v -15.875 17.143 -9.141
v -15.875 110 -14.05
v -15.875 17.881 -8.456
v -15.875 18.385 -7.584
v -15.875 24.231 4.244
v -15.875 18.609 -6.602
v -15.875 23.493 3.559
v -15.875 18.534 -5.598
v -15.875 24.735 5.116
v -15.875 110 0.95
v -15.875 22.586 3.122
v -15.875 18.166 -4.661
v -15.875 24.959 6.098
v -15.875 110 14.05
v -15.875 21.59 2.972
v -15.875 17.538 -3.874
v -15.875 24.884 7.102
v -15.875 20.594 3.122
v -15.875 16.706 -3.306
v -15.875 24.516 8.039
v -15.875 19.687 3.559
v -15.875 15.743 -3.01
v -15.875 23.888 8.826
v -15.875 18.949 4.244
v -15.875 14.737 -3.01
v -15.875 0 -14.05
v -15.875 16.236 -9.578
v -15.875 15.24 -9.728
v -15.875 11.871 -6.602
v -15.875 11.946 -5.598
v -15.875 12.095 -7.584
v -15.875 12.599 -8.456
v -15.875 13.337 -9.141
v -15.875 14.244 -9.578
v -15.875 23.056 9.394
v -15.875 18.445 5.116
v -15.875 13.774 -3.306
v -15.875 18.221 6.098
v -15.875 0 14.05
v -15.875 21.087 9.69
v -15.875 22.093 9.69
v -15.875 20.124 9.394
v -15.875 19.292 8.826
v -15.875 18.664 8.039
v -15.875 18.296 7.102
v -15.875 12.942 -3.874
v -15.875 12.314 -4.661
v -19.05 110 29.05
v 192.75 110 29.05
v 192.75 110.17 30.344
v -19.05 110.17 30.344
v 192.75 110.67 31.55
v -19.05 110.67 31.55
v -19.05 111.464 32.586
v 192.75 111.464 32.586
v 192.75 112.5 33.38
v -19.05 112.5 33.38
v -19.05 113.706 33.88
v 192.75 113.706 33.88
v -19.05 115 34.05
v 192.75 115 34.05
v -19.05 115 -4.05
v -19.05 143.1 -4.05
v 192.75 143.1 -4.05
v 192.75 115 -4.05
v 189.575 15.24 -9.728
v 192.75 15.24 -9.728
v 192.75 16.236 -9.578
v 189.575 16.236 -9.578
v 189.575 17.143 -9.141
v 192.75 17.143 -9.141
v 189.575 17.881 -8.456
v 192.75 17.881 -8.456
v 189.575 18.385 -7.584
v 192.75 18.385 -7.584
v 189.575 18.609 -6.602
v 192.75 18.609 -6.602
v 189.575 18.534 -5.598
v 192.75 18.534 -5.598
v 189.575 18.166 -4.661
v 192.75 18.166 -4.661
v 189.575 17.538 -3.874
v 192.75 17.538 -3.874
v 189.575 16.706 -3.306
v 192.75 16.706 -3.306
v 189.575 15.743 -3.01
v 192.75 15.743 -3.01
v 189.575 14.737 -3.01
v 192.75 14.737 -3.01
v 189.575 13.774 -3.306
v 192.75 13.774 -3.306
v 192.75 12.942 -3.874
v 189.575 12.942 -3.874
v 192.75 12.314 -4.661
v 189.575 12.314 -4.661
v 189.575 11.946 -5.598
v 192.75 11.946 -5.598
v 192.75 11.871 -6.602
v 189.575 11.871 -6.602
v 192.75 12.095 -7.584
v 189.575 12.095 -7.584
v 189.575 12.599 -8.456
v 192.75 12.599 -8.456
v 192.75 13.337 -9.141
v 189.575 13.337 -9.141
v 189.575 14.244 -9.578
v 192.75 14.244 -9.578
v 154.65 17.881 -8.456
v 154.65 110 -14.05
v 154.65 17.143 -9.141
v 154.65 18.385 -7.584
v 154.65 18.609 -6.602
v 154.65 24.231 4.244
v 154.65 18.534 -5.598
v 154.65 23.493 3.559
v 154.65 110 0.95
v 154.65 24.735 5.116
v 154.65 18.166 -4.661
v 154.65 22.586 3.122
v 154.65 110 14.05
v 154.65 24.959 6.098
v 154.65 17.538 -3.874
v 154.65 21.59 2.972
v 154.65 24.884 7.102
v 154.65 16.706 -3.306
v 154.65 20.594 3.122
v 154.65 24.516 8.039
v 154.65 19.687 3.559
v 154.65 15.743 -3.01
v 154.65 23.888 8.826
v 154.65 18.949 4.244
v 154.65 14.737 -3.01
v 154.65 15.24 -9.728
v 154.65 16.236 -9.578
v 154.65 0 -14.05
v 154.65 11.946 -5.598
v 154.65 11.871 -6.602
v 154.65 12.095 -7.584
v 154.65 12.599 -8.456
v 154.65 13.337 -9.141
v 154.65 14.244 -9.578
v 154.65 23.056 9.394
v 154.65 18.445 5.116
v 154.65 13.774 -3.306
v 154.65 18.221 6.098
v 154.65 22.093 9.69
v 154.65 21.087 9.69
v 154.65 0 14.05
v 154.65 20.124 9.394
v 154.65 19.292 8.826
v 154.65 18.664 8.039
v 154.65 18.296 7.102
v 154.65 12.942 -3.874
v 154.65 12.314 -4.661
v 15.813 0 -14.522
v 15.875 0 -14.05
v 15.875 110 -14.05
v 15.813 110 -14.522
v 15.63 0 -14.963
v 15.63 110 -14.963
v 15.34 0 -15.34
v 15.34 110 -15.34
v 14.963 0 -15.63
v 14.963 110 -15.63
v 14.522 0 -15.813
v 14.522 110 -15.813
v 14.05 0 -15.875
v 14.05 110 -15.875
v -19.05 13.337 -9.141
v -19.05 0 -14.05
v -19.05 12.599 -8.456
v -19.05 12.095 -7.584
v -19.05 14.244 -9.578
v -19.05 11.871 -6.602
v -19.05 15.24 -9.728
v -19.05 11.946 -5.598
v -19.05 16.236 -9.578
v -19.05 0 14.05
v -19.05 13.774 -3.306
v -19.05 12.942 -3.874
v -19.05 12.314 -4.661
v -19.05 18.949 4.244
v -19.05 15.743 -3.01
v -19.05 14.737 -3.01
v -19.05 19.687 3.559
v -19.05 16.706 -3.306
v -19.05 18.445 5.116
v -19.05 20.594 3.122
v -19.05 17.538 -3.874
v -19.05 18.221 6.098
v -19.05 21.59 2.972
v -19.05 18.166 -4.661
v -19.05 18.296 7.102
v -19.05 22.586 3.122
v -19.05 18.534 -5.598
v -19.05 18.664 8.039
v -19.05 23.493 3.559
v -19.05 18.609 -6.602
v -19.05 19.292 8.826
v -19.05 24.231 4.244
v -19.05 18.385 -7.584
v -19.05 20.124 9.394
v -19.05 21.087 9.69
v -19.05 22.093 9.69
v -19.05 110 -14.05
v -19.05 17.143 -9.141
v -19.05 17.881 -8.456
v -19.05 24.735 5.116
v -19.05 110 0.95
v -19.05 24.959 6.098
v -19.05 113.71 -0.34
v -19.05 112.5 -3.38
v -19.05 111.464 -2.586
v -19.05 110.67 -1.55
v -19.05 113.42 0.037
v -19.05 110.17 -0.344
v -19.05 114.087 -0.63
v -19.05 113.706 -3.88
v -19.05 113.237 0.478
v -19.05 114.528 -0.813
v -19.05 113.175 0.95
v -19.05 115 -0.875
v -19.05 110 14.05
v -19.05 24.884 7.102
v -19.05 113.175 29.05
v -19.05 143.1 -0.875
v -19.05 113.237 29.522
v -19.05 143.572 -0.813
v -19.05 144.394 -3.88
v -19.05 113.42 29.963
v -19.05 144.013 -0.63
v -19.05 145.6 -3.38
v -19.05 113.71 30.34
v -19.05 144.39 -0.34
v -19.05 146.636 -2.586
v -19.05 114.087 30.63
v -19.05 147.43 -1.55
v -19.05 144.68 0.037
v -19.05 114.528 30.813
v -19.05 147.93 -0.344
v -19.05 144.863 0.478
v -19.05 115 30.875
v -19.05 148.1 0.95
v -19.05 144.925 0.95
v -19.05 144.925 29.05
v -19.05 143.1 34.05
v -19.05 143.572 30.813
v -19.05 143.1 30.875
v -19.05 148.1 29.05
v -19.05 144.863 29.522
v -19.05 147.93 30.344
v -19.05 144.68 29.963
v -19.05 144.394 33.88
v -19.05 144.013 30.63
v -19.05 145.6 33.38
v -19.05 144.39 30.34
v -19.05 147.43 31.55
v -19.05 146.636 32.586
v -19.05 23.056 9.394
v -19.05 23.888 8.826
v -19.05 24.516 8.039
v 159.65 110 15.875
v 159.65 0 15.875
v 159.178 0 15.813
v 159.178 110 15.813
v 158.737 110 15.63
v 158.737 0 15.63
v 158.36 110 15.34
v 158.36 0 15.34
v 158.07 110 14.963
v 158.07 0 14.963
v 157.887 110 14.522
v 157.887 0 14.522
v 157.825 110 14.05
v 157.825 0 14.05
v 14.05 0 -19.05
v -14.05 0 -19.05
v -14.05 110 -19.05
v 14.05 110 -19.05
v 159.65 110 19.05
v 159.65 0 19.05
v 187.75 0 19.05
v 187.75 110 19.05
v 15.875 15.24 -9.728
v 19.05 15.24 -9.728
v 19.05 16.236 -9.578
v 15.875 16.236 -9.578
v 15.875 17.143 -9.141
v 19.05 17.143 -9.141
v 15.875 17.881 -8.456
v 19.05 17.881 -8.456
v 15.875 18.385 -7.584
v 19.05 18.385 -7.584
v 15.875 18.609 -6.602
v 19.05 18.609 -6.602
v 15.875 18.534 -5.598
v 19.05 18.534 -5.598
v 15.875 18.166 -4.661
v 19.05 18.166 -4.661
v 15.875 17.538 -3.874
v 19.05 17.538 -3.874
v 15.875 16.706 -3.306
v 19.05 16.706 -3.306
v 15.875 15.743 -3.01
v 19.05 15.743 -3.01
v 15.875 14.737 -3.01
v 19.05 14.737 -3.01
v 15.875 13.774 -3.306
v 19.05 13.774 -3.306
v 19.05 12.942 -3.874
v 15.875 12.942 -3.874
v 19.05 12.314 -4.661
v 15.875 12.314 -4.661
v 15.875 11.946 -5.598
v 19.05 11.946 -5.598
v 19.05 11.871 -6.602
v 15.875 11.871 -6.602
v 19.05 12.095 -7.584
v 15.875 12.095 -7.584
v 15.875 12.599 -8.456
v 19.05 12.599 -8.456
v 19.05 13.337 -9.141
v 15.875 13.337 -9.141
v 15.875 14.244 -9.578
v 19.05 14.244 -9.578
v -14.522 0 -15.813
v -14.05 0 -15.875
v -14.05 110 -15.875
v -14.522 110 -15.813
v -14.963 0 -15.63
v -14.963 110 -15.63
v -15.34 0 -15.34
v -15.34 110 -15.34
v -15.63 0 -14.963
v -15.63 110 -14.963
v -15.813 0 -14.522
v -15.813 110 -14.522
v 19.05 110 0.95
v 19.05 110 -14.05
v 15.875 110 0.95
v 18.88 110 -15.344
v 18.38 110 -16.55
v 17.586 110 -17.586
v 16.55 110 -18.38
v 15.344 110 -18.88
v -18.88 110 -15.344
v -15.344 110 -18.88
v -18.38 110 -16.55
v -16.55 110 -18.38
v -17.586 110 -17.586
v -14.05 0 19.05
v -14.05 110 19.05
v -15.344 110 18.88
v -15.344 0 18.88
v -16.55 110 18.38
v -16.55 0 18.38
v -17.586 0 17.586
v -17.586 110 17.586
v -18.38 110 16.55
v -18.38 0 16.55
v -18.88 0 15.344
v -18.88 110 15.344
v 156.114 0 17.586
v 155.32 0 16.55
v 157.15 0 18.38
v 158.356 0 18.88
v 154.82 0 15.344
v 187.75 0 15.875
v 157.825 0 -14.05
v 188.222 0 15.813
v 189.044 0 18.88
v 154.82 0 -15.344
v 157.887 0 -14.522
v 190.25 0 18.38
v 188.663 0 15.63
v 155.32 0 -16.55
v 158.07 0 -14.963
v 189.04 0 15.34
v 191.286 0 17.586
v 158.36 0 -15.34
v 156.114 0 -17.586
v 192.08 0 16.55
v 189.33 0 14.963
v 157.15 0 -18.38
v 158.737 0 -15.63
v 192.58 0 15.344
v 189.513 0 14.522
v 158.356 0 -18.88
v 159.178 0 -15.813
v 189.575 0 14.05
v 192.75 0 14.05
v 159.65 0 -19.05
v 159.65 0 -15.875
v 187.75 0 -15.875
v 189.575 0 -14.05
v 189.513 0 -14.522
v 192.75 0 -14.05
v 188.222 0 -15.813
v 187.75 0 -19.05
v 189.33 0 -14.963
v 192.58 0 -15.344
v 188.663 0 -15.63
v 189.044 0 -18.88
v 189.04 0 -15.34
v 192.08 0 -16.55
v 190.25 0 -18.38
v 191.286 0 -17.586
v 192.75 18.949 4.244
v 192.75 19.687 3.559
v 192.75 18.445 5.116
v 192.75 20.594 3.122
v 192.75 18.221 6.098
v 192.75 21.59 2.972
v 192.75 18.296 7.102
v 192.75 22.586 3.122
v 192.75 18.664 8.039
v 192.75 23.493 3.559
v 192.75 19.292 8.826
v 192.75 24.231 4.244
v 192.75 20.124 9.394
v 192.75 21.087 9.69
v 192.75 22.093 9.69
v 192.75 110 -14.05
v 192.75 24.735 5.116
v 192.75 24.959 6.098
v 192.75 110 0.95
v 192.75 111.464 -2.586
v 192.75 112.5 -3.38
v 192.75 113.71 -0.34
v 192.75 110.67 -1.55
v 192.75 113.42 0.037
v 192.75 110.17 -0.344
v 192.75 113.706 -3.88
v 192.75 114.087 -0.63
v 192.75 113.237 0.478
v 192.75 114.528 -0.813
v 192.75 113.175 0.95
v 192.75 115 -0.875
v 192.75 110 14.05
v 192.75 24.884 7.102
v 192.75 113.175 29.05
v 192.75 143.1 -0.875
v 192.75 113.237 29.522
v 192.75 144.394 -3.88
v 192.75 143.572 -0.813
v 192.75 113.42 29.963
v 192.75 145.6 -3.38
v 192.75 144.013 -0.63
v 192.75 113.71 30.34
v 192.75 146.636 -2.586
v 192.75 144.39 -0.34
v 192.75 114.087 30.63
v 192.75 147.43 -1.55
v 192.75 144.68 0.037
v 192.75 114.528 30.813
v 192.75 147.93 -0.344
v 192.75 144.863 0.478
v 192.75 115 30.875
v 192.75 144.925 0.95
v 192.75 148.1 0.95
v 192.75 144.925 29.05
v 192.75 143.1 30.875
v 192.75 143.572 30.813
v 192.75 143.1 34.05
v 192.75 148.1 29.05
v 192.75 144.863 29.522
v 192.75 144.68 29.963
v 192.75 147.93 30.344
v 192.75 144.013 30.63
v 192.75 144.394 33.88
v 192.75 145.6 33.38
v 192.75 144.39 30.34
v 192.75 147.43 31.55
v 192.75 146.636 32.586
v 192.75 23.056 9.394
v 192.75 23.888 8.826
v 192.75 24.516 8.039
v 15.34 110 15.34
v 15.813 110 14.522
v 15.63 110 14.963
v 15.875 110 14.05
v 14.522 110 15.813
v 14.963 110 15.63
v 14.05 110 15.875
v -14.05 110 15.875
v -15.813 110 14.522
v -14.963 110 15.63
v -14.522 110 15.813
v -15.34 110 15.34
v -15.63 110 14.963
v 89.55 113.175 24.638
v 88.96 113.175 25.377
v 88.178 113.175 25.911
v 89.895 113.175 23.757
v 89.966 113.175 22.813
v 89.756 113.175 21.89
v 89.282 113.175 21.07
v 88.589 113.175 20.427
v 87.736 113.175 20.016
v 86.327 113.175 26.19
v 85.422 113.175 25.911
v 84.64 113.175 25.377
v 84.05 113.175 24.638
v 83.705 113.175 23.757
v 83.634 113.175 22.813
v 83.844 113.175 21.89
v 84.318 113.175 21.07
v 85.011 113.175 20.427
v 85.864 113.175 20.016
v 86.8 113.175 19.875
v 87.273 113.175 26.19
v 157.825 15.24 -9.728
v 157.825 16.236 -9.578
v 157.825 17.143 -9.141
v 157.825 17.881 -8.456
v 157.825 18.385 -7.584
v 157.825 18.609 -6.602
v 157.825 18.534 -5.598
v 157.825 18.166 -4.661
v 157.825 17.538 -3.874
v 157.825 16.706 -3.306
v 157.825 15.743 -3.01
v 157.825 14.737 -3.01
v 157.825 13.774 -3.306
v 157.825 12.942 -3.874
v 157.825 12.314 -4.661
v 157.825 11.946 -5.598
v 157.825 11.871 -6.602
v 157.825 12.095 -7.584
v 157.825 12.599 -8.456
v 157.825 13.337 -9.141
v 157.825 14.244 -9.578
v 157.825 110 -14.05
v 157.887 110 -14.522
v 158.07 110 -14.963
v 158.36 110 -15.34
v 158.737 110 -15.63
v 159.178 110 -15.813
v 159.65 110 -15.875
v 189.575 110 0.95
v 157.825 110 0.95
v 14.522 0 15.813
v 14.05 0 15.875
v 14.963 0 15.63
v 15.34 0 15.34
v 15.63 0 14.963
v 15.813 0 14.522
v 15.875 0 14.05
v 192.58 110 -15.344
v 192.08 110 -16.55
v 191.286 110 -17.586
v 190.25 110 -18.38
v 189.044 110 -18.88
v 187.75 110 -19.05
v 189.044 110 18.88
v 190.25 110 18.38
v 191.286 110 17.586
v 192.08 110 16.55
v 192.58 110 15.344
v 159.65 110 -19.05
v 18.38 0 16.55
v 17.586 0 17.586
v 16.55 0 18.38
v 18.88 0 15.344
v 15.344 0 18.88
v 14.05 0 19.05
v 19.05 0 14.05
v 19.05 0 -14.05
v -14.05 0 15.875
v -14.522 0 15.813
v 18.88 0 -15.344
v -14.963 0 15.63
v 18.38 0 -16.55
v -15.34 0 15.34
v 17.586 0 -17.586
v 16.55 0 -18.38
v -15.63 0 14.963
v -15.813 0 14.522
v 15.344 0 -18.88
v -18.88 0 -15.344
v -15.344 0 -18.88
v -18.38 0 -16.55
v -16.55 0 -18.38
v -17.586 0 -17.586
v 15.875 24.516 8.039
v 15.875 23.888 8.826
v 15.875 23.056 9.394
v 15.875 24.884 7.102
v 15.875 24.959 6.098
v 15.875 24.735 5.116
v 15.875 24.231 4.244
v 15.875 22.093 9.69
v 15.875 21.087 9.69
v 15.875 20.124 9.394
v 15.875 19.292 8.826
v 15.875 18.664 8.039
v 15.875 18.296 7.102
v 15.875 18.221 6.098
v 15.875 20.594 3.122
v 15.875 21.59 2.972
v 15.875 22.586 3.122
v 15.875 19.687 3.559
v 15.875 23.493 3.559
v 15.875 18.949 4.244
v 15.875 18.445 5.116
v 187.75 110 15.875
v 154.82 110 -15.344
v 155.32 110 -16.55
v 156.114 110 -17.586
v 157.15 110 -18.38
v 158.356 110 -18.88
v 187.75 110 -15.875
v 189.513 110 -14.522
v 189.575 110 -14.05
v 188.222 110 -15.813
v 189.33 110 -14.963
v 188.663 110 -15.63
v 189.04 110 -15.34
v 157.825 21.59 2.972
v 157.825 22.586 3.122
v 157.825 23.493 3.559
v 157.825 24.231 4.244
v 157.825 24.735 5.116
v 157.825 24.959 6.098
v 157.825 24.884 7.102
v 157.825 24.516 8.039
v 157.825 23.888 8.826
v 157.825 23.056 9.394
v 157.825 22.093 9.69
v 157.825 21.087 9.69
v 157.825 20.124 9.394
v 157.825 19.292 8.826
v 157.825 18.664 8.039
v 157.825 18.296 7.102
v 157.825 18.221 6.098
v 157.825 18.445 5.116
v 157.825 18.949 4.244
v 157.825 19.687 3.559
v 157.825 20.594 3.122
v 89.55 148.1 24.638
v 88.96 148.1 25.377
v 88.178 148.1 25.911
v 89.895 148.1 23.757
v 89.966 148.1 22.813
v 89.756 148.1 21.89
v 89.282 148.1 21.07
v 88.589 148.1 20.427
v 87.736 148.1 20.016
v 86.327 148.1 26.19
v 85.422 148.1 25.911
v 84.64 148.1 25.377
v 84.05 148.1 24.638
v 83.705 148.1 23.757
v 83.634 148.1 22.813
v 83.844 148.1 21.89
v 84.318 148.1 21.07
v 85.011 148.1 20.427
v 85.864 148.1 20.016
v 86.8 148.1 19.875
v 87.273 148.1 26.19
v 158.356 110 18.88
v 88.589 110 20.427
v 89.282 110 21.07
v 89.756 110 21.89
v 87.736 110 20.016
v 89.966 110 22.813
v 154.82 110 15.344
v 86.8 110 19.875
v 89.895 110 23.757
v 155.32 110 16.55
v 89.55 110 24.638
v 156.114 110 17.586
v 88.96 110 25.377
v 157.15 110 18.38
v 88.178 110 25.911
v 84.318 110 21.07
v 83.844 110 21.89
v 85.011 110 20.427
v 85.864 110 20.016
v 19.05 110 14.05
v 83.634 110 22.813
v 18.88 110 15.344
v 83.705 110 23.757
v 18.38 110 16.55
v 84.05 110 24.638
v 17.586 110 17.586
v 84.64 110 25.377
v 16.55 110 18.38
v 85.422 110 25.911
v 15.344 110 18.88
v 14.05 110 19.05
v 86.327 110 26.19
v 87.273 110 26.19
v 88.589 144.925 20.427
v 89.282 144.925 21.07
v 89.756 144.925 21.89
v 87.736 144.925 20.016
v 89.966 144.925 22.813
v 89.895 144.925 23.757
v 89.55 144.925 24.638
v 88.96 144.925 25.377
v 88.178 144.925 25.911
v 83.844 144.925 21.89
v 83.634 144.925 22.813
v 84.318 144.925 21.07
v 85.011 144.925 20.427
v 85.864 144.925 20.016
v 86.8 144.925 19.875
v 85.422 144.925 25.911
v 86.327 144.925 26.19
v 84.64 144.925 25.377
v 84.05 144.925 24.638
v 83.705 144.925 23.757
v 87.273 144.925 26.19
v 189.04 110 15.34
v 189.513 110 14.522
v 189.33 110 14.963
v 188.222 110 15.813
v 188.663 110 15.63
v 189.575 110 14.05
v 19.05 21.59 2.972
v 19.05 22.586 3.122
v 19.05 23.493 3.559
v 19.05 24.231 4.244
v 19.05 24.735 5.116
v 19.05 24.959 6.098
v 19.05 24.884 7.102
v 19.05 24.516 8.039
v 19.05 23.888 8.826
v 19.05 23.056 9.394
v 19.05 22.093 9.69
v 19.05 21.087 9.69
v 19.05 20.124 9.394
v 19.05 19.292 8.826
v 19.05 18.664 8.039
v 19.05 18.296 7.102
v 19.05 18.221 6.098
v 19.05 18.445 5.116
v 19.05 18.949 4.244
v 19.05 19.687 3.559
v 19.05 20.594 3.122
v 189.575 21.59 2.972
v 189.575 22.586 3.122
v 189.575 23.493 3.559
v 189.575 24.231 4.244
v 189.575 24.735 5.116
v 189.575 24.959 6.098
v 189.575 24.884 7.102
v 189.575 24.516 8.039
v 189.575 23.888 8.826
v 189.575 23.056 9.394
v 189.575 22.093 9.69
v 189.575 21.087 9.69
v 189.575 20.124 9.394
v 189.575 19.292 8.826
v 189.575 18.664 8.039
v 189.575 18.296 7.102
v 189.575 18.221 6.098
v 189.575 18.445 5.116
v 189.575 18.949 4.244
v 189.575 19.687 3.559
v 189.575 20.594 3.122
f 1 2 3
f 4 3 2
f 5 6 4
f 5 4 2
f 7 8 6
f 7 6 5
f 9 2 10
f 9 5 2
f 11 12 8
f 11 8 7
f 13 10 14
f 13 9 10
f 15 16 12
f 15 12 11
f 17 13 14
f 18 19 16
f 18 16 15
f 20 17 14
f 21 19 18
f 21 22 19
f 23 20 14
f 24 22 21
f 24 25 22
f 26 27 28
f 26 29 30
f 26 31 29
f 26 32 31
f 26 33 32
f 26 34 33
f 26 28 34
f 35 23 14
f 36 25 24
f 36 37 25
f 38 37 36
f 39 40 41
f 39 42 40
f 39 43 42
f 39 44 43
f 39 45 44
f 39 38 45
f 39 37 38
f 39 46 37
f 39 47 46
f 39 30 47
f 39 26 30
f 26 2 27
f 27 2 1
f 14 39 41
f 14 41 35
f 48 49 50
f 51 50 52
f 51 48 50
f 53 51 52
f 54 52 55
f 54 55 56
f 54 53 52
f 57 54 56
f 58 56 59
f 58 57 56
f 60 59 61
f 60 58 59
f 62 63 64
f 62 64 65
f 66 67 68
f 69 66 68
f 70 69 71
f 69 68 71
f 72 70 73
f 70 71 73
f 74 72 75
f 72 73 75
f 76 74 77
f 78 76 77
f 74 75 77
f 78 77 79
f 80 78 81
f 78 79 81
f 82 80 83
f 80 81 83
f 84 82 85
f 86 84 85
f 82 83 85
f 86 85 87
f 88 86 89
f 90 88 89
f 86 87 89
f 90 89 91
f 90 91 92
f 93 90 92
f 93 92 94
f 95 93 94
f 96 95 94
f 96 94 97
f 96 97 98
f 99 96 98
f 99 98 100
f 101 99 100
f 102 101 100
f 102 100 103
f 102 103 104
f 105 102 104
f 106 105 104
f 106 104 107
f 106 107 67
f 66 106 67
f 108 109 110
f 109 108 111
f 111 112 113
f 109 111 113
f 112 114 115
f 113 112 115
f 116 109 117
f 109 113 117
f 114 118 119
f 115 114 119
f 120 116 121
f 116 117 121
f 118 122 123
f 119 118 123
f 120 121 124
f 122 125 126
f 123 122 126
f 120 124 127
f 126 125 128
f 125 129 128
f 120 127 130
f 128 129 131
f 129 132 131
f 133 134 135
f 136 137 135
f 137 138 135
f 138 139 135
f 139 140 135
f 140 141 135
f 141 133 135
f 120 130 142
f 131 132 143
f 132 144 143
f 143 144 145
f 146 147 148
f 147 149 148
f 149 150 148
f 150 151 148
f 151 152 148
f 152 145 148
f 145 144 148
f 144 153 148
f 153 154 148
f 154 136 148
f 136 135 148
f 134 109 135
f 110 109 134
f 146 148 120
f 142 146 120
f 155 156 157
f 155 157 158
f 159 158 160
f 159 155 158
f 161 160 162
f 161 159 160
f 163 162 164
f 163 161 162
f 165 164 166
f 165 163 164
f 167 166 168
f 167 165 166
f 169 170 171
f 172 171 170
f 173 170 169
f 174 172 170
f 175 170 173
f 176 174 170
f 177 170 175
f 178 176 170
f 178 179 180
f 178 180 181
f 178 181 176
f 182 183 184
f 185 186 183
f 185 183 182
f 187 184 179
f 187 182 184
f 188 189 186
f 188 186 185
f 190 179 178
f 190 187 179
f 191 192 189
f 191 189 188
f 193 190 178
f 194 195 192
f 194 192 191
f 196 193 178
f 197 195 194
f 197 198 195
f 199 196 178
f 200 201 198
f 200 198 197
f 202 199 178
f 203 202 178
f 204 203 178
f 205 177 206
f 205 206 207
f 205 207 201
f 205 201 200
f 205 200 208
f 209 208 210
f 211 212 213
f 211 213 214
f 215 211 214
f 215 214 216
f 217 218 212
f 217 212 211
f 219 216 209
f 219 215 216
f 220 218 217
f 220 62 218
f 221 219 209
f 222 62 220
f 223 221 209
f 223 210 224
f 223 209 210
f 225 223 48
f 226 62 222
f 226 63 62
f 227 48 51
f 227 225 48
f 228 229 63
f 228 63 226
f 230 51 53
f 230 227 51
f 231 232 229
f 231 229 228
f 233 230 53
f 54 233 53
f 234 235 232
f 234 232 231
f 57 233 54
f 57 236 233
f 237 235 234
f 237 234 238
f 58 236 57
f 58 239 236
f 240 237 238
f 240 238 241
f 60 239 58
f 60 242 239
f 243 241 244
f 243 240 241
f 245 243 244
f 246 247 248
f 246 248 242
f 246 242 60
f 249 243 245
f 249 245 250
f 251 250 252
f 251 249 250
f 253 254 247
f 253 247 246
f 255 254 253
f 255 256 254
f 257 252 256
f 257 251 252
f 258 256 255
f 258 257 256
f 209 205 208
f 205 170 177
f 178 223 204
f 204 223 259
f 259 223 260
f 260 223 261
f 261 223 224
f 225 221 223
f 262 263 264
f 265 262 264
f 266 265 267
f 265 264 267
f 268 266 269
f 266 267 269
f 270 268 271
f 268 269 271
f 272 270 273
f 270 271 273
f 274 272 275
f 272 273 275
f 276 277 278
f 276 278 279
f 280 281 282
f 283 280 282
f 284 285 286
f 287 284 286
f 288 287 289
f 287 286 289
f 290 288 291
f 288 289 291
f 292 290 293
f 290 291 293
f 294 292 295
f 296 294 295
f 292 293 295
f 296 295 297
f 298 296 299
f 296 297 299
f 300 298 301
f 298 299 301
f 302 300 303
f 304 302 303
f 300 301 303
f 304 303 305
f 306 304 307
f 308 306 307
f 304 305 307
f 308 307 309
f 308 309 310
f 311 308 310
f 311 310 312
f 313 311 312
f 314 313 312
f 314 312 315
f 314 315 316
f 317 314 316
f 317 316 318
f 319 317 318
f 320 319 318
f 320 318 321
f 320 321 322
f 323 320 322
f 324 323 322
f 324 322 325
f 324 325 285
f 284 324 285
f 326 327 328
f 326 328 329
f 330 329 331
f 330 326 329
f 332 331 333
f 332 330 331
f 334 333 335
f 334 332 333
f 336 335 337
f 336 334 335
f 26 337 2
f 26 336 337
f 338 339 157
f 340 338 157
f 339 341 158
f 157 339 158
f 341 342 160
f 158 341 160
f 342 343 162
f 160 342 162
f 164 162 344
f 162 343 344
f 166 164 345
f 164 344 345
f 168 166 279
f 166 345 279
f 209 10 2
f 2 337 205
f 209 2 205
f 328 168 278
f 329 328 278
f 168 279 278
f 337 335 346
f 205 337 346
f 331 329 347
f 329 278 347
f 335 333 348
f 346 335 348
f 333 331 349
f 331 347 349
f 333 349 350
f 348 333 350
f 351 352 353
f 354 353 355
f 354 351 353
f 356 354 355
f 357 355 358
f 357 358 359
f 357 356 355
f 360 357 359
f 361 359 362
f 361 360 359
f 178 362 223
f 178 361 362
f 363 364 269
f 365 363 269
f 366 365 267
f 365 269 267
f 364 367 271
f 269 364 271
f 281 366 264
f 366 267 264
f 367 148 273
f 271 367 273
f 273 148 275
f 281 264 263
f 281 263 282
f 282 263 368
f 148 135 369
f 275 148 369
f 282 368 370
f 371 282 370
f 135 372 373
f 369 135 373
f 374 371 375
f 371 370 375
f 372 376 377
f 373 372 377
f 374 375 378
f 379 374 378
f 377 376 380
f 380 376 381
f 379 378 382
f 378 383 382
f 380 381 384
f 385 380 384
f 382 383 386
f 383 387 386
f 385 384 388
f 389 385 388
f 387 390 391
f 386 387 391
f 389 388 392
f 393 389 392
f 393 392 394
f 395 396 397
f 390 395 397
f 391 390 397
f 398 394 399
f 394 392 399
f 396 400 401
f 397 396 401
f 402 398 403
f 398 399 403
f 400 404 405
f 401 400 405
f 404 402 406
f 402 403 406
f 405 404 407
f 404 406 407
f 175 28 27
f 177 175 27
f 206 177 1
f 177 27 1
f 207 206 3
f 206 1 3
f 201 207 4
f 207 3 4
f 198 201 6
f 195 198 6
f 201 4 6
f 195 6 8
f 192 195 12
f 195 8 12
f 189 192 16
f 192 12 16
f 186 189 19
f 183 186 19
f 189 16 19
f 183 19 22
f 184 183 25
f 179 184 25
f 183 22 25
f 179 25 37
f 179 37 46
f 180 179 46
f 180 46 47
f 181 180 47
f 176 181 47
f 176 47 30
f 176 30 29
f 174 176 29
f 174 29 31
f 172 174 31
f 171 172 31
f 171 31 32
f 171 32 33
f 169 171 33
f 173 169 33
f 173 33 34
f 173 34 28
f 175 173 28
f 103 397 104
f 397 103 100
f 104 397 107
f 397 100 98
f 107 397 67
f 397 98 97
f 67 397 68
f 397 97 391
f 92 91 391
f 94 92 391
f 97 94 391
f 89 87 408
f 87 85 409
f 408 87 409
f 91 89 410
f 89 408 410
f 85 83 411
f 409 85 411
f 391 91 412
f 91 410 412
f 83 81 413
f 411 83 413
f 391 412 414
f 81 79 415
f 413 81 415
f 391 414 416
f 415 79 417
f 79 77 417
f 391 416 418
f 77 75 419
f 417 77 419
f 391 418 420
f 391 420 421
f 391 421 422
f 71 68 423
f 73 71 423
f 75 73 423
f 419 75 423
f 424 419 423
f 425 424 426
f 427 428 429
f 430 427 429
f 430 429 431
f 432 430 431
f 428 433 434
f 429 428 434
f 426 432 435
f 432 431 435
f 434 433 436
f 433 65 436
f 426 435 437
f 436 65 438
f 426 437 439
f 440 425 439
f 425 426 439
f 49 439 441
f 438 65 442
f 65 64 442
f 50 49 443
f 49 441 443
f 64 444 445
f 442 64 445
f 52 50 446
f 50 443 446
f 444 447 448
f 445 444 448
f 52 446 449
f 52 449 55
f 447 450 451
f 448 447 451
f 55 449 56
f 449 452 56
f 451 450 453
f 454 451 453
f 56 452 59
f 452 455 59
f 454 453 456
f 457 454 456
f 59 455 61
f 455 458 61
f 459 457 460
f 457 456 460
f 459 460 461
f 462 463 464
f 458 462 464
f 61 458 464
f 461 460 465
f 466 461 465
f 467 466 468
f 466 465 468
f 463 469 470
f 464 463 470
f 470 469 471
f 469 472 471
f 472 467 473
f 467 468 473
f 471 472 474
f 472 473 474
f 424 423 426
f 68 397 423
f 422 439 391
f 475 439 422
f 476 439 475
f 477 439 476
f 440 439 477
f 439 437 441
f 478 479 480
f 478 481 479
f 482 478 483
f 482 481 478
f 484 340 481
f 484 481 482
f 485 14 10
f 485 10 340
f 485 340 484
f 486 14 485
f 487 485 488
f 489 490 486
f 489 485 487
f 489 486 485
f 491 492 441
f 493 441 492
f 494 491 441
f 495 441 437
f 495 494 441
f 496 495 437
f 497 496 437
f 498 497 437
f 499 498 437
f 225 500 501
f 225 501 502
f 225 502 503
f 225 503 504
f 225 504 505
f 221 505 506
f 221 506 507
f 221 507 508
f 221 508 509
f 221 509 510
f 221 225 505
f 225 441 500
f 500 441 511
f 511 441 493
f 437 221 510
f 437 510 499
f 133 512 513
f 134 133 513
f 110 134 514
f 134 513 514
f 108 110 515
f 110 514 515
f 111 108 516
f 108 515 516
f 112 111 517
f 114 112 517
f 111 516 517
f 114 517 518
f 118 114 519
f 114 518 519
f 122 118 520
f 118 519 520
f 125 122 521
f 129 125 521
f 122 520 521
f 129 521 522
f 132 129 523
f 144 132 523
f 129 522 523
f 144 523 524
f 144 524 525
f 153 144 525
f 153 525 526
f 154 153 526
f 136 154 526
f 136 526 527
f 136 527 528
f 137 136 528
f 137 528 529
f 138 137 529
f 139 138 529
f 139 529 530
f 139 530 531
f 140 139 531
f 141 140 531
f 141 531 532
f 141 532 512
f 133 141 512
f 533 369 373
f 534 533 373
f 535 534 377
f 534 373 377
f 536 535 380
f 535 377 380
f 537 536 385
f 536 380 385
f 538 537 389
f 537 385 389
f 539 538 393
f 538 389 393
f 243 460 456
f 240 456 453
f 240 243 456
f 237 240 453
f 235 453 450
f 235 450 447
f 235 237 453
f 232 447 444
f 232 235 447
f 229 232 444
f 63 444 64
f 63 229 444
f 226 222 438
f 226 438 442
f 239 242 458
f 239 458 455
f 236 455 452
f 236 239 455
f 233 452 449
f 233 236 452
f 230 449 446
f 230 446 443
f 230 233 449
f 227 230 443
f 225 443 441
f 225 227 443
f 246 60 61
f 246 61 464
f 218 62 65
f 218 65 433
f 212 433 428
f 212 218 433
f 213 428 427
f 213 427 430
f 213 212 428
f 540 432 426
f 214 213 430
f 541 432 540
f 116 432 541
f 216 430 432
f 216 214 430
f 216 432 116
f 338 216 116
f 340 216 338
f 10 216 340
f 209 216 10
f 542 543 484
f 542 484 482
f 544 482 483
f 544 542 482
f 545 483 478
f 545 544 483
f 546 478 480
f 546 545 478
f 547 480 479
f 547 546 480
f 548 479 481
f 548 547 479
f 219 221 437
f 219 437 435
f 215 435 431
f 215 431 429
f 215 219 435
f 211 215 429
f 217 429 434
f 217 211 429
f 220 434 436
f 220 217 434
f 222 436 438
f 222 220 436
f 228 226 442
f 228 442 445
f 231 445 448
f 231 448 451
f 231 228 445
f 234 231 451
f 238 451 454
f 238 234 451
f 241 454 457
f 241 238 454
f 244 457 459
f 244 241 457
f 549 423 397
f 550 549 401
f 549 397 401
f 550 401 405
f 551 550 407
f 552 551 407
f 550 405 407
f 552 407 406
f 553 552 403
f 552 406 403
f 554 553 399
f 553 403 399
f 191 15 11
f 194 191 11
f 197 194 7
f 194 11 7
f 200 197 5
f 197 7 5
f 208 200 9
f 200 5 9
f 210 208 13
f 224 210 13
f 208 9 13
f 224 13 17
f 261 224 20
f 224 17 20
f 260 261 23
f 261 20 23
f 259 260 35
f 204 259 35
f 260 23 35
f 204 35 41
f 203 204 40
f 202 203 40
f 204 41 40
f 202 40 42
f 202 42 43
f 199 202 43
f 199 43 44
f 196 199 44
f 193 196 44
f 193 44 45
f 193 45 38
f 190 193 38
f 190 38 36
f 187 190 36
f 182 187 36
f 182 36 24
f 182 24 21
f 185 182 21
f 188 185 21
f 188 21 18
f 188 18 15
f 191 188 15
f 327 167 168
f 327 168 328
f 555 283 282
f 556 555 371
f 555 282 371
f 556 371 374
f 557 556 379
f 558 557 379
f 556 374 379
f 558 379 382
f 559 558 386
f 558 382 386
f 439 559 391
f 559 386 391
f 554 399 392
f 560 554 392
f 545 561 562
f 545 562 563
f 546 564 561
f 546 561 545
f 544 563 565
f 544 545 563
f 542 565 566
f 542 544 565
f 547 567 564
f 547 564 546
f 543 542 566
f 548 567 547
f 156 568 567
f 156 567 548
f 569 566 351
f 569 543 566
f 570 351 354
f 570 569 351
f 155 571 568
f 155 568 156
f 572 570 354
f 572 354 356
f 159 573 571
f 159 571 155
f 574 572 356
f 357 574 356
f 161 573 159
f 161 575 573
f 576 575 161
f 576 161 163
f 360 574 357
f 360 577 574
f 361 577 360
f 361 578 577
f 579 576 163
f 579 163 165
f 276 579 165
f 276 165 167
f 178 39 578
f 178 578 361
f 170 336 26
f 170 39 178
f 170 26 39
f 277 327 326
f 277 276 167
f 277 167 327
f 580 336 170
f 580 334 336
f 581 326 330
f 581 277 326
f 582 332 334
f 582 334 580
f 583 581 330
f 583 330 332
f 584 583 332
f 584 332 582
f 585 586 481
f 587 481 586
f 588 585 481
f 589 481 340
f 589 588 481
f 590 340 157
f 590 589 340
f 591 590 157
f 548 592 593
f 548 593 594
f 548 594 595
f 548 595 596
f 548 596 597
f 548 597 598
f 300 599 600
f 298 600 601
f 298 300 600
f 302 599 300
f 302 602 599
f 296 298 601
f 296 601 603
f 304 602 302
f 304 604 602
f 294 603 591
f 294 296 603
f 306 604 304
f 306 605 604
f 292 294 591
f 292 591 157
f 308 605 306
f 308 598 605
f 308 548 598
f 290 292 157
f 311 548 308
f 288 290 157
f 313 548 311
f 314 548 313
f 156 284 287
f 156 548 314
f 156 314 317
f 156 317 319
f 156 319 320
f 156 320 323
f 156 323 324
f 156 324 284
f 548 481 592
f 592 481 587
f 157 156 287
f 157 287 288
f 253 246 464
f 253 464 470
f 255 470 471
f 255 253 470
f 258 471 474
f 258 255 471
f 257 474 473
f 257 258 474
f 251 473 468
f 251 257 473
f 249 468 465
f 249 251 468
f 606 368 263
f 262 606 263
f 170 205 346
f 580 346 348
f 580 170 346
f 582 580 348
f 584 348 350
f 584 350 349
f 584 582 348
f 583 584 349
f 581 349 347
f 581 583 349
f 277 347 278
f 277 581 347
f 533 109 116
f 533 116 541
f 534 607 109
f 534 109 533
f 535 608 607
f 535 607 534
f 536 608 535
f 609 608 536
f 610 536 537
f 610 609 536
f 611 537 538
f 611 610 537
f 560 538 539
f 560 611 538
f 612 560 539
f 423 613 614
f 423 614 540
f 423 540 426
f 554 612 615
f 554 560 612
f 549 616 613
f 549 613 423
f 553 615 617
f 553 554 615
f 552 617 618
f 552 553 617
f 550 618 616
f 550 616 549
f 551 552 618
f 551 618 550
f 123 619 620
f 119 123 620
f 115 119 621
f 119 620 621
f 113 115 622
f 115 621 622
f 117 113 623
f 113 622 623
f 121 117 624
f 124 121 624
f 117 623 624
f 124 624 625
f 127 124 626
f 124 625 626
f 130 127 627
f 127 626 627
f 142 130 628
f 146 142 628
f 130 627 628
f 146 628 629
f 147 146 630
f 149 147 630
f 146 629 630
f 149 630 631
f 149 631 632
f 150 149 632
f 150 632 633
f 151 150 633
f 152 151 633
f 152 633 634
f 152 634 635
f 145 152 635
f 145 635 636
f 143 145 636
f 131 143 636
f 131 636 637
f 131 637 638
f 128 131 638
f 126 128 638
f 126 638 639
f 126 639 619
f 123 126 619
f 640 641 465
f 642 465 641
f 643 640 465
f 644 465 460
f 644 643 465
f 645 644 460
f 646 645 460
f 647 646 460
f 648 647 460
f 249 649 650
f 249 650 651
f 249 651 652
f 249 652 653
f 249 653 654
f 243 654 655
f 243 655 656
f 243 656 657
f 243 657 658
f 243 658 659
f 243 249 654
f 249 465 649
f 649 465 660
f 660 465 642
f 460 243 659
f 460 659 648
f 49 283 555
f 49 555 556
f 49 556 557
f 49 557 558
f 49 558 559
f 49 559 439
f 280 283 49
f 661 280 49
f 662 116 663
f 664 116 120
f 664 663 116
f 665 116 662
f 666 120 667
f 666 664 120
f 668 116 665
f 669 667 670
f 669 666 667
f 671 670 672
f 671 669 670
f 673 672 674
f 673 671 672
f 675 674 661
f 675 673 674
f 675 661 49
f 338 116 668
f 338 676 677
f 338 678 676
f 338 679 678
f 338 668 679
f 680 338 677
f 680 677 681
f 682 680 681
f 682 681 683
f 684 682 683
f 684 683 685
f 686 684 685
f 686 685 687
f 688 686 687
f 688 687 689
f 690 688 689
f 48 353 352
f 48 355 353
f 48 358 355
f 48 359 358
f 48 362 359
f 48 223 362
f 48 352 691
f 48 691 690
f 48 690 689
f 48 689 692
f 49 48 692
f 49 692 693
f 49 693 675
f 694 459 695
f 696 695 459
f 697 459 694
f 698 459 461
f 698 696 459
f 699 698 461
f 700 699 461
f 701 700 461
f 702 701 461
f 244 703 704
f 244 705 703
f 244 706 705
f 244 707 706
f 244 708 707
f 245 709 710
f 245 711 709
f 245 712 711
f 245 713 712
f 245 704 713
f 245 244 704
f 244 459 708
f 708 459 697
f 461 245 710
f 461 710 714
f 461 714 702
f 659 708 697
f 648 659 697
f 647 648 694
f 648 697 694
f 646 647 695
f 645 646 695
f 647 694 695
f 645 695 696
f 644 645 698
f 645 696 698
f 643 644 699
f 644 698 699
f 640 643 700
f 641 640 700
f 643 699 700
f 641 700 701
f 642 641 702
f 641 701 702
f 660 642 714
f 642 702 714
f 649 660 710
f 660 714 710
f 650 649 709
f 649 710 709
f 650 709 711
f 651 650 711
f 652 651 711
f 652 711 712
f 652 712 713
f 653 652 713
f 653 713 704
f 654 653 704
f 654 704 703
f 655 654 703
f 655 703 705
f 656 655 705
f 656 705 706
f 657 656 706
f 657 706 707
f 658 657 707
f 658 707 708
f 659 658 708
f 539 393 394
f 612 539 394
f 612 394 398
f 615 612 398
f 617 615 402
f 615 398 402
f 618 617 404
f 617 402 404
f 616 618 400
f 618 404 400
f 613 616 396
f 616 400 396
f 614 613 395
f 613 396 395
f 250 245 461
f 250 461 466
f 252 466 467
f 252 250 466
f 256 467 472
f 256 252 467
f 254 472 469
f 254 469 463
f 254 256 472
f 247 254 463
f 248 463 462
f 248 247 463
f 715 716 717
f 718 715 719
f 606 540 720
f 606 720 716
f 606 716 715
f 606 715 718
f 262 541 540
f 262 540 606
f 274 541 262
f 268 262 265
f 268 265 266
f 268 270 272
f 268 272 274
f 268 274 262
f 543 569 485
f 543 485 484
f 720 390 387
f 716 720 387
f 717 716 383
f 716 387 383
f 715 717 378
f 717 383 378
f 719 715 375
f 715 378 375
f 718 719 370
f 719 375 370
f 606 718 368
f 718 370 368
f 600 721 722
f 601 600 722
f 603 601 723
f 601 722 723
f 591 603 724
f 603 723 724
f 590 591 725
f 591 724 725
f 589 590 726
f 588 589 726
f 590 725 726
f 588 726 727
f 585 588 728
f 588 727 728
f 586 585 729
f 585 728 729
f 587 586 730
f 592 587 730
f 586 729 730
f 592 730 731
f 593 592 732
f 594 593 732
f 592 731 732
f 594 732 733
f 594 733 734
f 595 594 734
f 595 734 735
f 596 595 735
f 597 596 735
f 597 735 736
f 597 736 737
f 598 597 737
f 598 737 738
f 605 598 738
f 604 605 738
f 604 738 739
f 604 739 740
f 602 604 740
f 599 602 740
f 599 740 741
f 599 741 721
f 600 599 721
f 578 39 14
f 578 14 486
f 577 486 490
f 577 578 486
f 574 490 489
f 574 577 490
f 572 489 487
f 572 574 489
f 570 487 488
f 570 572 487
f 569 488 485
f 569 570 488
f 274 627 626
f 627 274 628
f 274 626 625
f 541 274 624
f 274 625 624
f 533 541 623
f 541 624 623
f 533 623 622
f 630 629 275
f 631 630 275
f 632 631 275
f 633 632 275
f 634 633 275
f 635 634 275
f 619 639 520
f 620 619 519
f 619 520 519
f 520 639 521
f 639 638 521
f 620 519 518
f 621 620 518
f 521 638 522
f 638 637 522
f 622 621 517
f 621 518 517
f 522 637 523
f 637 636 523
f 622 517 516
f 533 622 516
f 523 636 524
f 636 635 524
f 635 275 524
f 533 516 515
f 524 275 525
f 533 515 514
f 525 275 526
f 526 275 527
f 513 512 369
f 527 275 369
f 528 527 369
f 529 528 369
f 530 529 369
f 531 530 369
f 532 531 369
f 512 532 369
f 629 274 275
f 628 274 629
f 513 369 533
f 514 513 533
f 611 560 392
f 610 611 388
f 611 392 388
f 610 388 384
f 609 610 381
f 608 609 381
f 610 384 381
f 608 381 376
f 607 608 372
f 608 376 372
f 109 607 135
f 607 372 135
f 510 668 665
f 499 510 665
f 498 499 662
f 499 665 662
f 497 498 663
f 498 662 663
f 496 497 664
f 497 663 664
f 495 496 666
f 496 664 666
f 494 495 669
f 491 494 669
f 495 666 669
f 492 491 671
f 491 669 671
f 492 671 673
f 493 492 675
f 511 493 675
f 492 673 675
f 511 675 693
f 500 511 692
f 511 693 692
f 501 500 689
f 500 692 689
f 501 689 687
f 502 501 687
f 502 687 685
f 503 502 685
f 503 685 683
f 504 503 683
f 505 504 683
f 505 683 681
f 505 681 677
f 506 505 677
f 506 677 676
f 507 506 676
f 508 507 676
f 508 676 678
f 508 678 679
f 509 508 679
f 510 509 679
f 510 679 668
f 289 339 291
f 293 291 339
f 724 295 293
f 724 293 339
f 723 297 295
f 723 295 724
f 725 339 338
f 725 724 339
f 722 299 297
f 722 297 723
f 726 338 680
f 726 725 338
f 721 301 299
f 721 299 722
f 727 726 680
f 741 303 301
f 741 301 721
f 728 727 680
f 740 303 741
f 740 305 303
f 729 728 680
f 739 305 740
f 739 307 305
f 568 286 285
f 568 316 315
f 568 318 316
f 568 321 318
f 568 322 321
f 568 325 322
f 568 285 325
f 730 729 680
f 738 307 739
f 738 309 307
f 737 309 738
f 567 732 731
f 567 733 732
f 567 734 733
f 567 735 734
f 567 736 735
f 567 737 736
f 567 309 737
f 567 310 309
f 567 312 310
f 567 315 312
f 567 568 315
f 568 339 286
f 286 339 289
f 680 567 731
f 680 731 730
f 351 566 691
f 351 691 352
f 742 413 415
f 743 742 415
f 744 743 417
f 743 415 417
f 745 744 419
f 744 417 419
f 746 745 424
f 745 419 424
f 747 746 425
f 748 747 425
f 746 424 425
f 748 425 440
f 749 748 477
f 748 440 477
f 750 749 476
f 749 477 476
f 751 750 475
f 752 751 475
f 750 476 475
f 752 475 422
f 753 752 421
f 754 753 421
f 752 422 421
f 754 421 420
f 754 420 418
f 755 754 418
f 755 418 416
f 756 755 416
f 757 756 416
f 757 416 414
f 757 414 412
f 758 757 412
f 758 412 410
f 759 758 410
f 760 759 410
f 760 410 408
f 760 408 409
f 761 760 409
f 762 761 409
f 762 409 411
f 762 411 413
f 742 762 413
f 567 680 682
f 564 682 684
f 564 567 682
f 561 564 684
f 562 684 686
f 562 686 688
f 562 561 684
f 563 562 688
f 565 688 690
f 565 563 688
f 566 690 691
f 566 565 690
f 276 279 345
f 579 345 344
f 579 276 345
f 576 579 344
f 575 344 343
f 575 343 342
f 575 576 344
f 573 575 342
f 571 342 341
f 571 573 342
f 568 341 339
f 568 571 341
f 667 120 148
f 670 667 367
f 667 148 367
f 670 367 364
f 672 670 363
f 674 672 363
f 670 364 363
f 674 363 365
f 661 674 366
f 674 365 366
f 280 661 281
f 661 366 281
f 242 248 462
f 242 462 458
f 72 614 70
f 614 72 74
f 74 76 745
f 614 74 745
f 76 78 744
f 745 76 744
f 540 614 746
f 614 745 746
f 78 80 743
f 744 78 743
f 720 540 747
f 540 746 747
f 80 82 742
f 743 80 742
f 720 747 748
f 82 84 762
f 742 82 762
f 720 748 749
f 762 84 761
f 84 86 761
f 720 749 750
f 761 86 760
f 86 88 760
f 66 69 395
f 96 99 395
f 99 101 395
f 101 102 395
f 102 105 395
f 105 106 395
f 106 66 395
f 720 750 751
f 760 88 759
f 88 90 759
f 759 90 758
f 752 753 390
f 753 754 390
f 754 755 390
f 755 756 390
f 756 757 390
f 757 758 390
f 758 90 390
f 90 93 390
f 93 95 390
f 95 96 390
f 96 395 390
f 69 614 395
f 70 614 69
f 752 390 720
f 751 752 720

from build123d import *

# Parameters (mm, degrees)
BOSS_EXTRUDE1_DEPTH     = 110
BOSS_EXTRUDE2_START     = -105.9
BOSS_EXTRUDE2_DEPTH     = 211.8
CUT_EXTRUDE1_REACH      = 226.526
SKETCH3_R               = 3.175
F_1_4_CLEARANCE_HOLE1_D = 6.7564


with BuildPart() as part:
    # Sketch1 → Boss-Extrude1 (new body)
    with BuildSketch(Plane(origin=(0, 0, 0), x_dir=(1, 0, 0), z_dir=(0, 1, 0))):
        with BuildLine():
            Line((-14.05, 19.05), (14.05, 19.05))
            ThreePointArc((14.05, 19.05), (17.585533906, 17.585533906), (19.05, 14.05))
            Line((19.05, 14.05), (19.05, -14.05))
            ThreePointArc((19.05, -14.05), (17.585533906, -17.585533906), (14.05, -19.05))
            Line((14.05, -19.05), (-14.05, -19.05))
            ThreePointArc((-14.05, -19.05), (-17.585533906, -17.585533906), (-19.05, -14.05))
            Line((-19.05, -14.05), (-19.05, 14.05))
            ThreePointArc((-19.05, 14.05), (-17.585533906, 17.585533906), (-14.05, 19.05))
        make_face()
        with BuildLine():
            Line((-15.875, 14.05), (-15.875, -14.05))
            ThreePointArc((-15.875, -14.05), (-15.340469876, -15.340469876), (-14.05, -15.875))
            Line((-14.05, -15.875), (14.05, -15.875))
            ThreePointArc((14.05, -15.875), (15.340469876, -15.340469876), (15.875, -14.05))
            Line((15.875, -14.05), (15.875, 14.05))
            ThreePointArc((15.875, 14.05), (15.340469876, 15.340469876), (14.05, 15.875))
            Line((14.05, 15.875), (-14.05, 15.875))
            ThreePointArc((-14.05, 15.875), (-15.340469876, 15.340469876), (-15.875, 14.05))
        make_face(mode=Mode.SUBTRACT)
    extrude(amount=BOSS_EXTRUDE1_DEPTH)


with BuildPart() as body_2:
    # Mirror2: mirrored copy
    add(part.part.mirror(Plane(origin=(86.85, 0, 0), x_dir=(0, 0, 1), z_dir=(1, 0, 0))))


with BuildPart() as part_1:
    add(part.part)

    add(body_2.part)  # Boss-Extrude2 merges body 2
    # Sketch2 → Boss-Extrude2 (add)
    with BuildSketch(Plane(origin=(86.85, 0, 0), x_dir=(0, 0, -1), z_dir=(1, 0, 0)).offset(BOSS_EXTRUDE2_START)):
        with BuildLine():
            Line((-29.05, 148.1), (-0.95, 148.1))
            ThreePointArc((-0.95, 148.1), (2.585533906, 146.635533906), (4.05, 143.1))
            Line((4.05, 143.1), (4.05, 115))
            ThreePointArc((4.05, 115), (2.585533906, 111.464466094), (-0.95, 110))
            Line((-0.95, 110), (-29.05, 110))
            ThreePointArc((-29.05, 110), (-32.585533906, 111.464466094), (-34.05, 115))
            Line((-34.05, 115), (-34.05, 143.1))
            ThreePointArc((-34.05, 143.1), (-32.585533906, 146.635533906), (-29.05, 148.1))
        make_face()
        with BuildLine():
            Line((-30.875, 143.1), (-30.875, 115))
            ThreePointArc((-30.875, 115), (-30.340469876, 113.709530124), (-29.05, 113.175))
            Line((-29.05, 113.175), (-0.95, 113.175))
            ThreePointArc((-0.95, 113.175), (0.340469876, 113.709530124), (0.875, 115))
            Line((0.875, 115), (0.875, 143.1))
            ThreePointArc((0.875, 143.1), (0.340469876, 144.390469876), (-0.95, 144.925))
            Line((-0.95, 144.925), (-29.05, 144.925))
            ThreePointArc((-29.05, 144.925), (-30.340469876, 144.390469876), (-30.875, 143.1))
        make_face(mode=Mode.SUBTRACT)
    extrude(amount=BOSS_EXTRUDE2_DEPTH)

    # Cut-Extrude1: up to this face of the body (flat: up to its plane)
    cut_extrude1_end = Plane(part_1.part.faces().sort_by_distance((86.85, 148.1, 15))[0])
    # Sketch3 → Cut-Extrude1 (cut, up to the picked face)
    with BuildSketch(Plane.XZ.offset(-110), mode=Mode.PRIVATE) as cut_extrude1_sk1:
        with Locations(Location((86.8, 23.050000029, 0), (0, 0, 270))):
            Circle(SKETCH3_R)
    cut_extrude1_tool1 = split(extrude(cut_extrude1_sk1.sketch, amount=-CUT_EXTRUDE1_REACH, mode=Mode.PRIVATE), bisect_by=cut_extrude1_end, keep=Keep.BOTH, mode=Mode.PRIVATE)
    add(cut_extrude1_tool1.solids().sort_by(Axis((86.8, 110, 23.05), (0, 1, 0)))[0], mode=Mode.SUBTRACT)

    # 1/4 Clearance Hole1 (through all)
    with Locations(Plane.ZY.offset(19.05)):
        with Locations((-6.35, 15.24), (6.35, 21.59)):
            Hole(F_1_4_CLEARANCE_HOLE1_D / 2)


solid = part_1.part
